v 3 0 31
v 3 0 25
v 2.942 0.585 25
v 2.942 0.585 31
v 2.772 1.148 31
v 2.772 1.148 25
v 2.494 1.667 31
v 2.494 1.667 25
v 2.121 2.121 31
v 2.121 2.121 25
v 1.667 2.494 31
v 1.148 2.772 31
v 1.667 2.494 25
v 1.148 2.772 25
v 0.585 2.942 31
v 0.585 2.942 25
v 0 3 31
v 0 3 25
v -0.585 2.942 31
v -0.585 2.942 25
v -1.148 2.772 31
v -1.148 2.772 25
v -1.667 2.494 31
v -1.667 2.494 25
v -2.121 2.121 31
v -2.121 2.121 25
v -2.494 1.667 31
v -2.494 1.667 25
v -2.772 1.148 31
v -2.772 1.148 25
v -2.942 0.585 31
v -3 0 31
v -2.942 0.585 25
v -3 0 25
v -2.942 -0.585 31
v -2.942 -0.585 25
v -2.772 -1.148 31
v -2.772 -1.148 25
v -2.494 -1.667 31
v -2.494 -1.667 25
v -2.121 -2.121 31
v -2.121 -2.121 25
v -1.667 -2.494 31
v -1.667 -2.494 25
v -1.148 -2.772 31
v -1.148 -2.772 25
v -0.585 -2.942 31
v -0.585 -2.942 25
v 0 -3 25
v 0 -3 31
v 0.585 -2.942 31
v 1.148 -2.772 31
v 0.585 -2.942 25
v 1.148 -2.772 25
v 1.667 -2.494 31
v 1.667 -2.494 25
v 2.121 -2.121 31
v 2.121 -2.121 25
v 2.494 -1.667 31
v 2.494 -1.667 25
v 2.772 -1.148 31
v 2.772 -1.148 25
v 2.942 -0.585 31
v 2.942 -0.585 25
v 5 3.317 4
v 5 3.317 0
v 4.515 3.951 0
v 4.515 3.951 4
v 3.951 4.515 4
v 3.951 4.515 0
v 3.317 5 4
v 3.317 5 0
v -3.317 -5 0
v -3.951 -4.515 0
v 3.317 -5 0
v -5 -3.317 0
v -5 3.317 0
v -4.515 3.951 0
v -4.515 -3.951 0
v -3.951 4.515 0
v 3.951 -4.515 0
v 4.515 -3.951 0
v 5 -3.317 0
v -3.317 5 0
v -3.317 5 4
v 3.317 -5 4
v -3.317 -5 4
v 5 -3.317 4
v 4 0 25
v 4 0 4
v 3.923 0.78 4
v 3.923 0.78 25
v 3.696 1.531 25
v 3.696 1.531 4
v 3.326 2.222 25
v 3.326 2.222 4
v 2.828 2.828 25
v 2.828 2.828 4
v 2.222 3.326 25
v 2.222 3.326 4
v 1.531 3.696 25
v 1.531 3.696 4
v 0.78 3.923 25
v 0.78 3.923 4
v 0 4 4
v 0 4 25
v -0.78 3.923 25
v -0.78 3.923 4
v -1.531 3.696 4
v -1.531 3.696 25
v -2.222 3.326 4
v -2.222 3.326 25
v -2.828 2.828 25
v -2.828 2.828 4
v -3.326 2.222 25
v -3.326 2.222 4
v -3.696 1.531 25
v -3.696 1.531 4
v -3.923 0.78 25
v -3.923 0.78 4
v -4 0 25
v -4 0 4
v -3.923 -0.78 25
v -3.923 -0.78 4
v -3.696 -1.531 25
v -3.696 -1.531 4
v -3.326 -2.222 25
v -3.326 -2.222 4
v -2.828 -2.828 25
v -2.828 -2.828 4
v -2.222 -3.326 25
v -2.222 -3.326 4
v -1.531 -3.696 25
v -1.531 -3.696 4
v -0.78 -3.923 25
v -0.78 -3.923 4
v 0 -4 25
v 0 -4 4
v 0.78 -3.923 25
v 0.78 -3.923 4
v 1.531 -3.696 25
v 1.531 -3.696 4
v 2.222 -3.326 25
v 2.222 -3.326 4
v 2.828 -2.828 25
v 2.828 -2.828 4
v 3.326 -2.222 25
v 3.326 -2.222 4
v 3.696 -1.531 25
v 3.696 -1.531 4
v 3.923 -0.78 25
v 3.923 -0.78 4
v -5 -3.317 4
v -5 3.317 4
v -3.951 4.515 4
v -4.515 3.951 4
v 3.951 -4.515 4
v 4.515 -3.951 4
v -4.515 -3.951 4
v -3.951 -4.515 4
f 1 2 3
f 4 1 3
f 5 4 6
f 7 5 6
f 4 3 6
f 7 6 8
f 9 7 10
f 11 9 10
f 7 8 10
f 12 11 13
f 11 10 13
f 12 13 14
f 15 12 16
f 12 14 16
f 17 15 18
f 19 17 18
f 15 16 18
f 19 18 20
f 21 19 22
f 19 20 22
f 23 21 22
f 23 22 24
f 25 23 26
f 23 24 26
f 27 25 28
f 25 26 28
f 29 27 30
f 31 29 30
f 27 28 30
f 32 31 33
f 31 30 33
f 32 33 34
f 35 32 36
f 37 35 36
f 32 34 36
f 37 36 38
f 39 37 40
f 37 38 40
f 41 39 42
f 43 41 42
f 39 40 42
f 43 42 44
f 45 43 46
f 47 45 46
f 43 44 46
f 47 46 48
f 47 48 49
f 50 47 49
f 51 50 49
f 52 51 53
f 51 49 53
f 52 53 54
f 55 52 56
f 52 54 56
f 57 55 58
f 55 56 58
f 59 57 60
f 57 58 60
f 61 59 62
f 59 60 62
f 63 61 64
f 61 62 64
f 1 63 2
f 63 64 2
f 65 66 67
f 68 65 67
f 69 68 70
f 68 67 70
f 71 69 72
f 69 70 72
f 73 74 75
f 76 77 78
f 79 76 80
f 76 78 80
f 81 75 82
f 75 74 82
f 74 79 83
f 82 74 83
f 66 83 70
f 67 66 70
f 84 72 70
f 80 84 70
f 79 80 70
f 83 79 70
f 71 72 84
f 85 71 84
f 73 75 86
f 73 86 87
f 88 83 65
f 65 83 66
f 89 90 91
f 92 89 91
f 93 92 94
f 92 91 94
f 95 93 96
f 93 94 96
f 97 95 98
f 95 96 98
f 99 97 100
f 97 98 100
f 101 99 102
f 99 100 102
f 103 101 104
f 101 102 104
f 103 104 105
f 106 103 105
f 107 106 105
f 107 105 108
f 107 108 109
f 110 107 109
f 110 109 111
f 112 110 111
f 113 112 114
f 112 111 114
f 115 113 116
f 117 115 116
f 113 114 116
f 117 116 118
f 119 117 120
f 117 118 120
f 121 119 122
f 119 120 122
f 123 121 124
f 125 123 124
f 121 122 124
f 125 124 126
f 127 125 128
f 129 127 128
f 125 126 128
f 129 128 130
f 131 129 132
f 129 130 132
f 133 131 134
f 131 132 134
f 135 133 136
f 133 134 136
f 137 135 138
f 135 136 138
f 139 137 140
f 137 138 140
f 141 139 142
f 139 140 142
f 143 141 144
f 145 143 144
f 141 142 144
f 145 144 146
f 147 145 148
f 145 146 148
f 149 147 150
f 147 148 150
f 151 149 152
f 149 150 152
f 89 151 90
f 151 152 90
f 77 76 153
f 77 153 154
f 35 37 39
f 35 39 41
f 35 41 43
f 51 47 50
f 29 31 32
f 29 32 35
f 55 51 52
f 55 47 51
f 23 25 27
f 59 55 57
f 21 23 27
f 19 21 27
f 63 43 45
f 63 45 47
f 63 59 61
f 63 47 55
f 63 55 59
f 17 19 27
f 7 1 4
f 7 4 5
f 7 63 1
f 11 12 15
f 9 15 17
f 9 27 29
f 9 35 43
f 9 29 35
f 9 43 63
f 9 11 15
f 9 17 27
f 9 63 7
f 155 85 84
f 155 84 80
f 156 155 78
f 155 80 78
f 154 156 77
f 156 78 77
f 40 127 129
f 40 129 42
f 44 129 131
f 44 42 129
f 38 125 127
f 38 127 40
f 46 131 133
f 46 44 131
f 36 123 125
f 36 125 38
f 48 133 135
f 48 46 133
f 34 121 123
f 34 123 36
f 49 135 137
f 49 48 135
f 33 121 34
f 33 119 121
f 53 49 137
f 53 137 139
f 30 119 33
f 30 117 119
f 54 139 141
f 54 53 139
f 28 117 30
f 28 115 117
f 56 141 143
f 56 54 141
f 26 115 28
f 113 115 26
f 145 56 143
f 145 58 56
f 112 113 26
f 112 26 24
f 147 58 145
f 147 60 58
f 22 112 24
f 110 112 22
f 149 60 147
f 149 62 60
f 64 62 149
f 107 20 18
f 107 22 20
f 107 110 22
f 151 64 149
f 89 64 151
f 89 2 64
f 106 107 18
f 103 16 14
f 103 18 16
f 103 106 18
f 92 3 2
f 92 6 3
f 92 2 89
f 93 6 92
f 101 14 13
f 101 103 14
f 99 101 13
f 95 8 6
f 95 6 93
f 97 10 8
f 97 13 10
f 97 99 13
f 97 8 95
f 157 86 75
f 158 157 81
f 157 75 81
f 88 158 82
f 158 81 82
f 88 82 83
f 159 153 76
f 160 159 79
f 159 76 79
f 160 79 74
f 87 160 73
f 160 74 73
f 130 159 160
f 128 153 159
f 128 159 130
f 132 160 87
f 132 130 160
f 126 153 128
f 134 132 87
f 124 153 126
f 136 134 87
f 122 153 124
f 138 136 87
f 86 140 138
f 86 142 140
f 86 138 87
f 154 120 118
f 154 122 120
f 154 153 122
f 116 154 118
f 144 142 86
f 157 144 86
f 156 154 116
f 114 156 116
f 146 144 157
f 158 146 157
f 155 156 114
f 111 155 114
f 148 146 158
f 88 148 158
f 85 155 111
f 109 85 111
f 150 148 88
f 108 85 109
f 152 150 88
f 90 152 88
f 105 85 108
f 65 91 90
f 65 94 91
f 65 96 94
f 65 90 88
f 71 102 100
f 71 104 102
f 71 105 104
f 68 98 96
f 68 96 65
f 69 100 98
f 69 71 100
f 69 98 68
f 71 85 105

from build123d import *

# Parameters (mm, degrees)
SKETCH_1_R          = 6
EXTRUDE_1_DEPTH     = 4
SKETCH_2_R          = 4
EXTRUDE_2_DEPTH     = 21
SKETCH_3_R          = 3
EXTRUDE_3_DEPTH     = 6
SKETCH_4_R          = 7.5
SKETCH_4_W          = 10
SKETCH_4_H          = 10
CUT_EXTRUDE_1_DEPTH = 6


with BuildPart() as part:
    # 草图1 → 凸台-拉伸1 (new body)
    with BuildSketch(Plane.XY):
        Circle(SKETCH_1_R)
    extrude(amount=EXTRUDE_1_DEPTH)

    # 草图2 → 凸台-拉伸2 (add)
    with BuildSketch(Plane.XY.offset(4)):
        Circle(SKETCH_2_R)
    extrude(amount=EXTRUDE_2_DEPTH)

    # 草图3 → 凸台-拉伸3 (add)
    with BuildSketch(Plane.XY.offset(25)):
        Circle(SKETCH_3_R)
    extrude(amount=EXTRUDE_3_DEPTH)

    # 草图4 → 切除-拉伸1 (cut)
    with BuildSketch(Plane(origin=(0, 0, 0), x_dir=(-1, 0, 0), z_dir=(0, 0, -1))):
        Circle(SKETCH_4_R)
        Rectangle(SKETCH_4_W, SKETCH_4_H, mode=Mode.SUBTRACT)
    extrude(amount=-CUT_EXTRUDE_1_DEPTH, mode=Mode.SUBTRACT)


solid = part.part
